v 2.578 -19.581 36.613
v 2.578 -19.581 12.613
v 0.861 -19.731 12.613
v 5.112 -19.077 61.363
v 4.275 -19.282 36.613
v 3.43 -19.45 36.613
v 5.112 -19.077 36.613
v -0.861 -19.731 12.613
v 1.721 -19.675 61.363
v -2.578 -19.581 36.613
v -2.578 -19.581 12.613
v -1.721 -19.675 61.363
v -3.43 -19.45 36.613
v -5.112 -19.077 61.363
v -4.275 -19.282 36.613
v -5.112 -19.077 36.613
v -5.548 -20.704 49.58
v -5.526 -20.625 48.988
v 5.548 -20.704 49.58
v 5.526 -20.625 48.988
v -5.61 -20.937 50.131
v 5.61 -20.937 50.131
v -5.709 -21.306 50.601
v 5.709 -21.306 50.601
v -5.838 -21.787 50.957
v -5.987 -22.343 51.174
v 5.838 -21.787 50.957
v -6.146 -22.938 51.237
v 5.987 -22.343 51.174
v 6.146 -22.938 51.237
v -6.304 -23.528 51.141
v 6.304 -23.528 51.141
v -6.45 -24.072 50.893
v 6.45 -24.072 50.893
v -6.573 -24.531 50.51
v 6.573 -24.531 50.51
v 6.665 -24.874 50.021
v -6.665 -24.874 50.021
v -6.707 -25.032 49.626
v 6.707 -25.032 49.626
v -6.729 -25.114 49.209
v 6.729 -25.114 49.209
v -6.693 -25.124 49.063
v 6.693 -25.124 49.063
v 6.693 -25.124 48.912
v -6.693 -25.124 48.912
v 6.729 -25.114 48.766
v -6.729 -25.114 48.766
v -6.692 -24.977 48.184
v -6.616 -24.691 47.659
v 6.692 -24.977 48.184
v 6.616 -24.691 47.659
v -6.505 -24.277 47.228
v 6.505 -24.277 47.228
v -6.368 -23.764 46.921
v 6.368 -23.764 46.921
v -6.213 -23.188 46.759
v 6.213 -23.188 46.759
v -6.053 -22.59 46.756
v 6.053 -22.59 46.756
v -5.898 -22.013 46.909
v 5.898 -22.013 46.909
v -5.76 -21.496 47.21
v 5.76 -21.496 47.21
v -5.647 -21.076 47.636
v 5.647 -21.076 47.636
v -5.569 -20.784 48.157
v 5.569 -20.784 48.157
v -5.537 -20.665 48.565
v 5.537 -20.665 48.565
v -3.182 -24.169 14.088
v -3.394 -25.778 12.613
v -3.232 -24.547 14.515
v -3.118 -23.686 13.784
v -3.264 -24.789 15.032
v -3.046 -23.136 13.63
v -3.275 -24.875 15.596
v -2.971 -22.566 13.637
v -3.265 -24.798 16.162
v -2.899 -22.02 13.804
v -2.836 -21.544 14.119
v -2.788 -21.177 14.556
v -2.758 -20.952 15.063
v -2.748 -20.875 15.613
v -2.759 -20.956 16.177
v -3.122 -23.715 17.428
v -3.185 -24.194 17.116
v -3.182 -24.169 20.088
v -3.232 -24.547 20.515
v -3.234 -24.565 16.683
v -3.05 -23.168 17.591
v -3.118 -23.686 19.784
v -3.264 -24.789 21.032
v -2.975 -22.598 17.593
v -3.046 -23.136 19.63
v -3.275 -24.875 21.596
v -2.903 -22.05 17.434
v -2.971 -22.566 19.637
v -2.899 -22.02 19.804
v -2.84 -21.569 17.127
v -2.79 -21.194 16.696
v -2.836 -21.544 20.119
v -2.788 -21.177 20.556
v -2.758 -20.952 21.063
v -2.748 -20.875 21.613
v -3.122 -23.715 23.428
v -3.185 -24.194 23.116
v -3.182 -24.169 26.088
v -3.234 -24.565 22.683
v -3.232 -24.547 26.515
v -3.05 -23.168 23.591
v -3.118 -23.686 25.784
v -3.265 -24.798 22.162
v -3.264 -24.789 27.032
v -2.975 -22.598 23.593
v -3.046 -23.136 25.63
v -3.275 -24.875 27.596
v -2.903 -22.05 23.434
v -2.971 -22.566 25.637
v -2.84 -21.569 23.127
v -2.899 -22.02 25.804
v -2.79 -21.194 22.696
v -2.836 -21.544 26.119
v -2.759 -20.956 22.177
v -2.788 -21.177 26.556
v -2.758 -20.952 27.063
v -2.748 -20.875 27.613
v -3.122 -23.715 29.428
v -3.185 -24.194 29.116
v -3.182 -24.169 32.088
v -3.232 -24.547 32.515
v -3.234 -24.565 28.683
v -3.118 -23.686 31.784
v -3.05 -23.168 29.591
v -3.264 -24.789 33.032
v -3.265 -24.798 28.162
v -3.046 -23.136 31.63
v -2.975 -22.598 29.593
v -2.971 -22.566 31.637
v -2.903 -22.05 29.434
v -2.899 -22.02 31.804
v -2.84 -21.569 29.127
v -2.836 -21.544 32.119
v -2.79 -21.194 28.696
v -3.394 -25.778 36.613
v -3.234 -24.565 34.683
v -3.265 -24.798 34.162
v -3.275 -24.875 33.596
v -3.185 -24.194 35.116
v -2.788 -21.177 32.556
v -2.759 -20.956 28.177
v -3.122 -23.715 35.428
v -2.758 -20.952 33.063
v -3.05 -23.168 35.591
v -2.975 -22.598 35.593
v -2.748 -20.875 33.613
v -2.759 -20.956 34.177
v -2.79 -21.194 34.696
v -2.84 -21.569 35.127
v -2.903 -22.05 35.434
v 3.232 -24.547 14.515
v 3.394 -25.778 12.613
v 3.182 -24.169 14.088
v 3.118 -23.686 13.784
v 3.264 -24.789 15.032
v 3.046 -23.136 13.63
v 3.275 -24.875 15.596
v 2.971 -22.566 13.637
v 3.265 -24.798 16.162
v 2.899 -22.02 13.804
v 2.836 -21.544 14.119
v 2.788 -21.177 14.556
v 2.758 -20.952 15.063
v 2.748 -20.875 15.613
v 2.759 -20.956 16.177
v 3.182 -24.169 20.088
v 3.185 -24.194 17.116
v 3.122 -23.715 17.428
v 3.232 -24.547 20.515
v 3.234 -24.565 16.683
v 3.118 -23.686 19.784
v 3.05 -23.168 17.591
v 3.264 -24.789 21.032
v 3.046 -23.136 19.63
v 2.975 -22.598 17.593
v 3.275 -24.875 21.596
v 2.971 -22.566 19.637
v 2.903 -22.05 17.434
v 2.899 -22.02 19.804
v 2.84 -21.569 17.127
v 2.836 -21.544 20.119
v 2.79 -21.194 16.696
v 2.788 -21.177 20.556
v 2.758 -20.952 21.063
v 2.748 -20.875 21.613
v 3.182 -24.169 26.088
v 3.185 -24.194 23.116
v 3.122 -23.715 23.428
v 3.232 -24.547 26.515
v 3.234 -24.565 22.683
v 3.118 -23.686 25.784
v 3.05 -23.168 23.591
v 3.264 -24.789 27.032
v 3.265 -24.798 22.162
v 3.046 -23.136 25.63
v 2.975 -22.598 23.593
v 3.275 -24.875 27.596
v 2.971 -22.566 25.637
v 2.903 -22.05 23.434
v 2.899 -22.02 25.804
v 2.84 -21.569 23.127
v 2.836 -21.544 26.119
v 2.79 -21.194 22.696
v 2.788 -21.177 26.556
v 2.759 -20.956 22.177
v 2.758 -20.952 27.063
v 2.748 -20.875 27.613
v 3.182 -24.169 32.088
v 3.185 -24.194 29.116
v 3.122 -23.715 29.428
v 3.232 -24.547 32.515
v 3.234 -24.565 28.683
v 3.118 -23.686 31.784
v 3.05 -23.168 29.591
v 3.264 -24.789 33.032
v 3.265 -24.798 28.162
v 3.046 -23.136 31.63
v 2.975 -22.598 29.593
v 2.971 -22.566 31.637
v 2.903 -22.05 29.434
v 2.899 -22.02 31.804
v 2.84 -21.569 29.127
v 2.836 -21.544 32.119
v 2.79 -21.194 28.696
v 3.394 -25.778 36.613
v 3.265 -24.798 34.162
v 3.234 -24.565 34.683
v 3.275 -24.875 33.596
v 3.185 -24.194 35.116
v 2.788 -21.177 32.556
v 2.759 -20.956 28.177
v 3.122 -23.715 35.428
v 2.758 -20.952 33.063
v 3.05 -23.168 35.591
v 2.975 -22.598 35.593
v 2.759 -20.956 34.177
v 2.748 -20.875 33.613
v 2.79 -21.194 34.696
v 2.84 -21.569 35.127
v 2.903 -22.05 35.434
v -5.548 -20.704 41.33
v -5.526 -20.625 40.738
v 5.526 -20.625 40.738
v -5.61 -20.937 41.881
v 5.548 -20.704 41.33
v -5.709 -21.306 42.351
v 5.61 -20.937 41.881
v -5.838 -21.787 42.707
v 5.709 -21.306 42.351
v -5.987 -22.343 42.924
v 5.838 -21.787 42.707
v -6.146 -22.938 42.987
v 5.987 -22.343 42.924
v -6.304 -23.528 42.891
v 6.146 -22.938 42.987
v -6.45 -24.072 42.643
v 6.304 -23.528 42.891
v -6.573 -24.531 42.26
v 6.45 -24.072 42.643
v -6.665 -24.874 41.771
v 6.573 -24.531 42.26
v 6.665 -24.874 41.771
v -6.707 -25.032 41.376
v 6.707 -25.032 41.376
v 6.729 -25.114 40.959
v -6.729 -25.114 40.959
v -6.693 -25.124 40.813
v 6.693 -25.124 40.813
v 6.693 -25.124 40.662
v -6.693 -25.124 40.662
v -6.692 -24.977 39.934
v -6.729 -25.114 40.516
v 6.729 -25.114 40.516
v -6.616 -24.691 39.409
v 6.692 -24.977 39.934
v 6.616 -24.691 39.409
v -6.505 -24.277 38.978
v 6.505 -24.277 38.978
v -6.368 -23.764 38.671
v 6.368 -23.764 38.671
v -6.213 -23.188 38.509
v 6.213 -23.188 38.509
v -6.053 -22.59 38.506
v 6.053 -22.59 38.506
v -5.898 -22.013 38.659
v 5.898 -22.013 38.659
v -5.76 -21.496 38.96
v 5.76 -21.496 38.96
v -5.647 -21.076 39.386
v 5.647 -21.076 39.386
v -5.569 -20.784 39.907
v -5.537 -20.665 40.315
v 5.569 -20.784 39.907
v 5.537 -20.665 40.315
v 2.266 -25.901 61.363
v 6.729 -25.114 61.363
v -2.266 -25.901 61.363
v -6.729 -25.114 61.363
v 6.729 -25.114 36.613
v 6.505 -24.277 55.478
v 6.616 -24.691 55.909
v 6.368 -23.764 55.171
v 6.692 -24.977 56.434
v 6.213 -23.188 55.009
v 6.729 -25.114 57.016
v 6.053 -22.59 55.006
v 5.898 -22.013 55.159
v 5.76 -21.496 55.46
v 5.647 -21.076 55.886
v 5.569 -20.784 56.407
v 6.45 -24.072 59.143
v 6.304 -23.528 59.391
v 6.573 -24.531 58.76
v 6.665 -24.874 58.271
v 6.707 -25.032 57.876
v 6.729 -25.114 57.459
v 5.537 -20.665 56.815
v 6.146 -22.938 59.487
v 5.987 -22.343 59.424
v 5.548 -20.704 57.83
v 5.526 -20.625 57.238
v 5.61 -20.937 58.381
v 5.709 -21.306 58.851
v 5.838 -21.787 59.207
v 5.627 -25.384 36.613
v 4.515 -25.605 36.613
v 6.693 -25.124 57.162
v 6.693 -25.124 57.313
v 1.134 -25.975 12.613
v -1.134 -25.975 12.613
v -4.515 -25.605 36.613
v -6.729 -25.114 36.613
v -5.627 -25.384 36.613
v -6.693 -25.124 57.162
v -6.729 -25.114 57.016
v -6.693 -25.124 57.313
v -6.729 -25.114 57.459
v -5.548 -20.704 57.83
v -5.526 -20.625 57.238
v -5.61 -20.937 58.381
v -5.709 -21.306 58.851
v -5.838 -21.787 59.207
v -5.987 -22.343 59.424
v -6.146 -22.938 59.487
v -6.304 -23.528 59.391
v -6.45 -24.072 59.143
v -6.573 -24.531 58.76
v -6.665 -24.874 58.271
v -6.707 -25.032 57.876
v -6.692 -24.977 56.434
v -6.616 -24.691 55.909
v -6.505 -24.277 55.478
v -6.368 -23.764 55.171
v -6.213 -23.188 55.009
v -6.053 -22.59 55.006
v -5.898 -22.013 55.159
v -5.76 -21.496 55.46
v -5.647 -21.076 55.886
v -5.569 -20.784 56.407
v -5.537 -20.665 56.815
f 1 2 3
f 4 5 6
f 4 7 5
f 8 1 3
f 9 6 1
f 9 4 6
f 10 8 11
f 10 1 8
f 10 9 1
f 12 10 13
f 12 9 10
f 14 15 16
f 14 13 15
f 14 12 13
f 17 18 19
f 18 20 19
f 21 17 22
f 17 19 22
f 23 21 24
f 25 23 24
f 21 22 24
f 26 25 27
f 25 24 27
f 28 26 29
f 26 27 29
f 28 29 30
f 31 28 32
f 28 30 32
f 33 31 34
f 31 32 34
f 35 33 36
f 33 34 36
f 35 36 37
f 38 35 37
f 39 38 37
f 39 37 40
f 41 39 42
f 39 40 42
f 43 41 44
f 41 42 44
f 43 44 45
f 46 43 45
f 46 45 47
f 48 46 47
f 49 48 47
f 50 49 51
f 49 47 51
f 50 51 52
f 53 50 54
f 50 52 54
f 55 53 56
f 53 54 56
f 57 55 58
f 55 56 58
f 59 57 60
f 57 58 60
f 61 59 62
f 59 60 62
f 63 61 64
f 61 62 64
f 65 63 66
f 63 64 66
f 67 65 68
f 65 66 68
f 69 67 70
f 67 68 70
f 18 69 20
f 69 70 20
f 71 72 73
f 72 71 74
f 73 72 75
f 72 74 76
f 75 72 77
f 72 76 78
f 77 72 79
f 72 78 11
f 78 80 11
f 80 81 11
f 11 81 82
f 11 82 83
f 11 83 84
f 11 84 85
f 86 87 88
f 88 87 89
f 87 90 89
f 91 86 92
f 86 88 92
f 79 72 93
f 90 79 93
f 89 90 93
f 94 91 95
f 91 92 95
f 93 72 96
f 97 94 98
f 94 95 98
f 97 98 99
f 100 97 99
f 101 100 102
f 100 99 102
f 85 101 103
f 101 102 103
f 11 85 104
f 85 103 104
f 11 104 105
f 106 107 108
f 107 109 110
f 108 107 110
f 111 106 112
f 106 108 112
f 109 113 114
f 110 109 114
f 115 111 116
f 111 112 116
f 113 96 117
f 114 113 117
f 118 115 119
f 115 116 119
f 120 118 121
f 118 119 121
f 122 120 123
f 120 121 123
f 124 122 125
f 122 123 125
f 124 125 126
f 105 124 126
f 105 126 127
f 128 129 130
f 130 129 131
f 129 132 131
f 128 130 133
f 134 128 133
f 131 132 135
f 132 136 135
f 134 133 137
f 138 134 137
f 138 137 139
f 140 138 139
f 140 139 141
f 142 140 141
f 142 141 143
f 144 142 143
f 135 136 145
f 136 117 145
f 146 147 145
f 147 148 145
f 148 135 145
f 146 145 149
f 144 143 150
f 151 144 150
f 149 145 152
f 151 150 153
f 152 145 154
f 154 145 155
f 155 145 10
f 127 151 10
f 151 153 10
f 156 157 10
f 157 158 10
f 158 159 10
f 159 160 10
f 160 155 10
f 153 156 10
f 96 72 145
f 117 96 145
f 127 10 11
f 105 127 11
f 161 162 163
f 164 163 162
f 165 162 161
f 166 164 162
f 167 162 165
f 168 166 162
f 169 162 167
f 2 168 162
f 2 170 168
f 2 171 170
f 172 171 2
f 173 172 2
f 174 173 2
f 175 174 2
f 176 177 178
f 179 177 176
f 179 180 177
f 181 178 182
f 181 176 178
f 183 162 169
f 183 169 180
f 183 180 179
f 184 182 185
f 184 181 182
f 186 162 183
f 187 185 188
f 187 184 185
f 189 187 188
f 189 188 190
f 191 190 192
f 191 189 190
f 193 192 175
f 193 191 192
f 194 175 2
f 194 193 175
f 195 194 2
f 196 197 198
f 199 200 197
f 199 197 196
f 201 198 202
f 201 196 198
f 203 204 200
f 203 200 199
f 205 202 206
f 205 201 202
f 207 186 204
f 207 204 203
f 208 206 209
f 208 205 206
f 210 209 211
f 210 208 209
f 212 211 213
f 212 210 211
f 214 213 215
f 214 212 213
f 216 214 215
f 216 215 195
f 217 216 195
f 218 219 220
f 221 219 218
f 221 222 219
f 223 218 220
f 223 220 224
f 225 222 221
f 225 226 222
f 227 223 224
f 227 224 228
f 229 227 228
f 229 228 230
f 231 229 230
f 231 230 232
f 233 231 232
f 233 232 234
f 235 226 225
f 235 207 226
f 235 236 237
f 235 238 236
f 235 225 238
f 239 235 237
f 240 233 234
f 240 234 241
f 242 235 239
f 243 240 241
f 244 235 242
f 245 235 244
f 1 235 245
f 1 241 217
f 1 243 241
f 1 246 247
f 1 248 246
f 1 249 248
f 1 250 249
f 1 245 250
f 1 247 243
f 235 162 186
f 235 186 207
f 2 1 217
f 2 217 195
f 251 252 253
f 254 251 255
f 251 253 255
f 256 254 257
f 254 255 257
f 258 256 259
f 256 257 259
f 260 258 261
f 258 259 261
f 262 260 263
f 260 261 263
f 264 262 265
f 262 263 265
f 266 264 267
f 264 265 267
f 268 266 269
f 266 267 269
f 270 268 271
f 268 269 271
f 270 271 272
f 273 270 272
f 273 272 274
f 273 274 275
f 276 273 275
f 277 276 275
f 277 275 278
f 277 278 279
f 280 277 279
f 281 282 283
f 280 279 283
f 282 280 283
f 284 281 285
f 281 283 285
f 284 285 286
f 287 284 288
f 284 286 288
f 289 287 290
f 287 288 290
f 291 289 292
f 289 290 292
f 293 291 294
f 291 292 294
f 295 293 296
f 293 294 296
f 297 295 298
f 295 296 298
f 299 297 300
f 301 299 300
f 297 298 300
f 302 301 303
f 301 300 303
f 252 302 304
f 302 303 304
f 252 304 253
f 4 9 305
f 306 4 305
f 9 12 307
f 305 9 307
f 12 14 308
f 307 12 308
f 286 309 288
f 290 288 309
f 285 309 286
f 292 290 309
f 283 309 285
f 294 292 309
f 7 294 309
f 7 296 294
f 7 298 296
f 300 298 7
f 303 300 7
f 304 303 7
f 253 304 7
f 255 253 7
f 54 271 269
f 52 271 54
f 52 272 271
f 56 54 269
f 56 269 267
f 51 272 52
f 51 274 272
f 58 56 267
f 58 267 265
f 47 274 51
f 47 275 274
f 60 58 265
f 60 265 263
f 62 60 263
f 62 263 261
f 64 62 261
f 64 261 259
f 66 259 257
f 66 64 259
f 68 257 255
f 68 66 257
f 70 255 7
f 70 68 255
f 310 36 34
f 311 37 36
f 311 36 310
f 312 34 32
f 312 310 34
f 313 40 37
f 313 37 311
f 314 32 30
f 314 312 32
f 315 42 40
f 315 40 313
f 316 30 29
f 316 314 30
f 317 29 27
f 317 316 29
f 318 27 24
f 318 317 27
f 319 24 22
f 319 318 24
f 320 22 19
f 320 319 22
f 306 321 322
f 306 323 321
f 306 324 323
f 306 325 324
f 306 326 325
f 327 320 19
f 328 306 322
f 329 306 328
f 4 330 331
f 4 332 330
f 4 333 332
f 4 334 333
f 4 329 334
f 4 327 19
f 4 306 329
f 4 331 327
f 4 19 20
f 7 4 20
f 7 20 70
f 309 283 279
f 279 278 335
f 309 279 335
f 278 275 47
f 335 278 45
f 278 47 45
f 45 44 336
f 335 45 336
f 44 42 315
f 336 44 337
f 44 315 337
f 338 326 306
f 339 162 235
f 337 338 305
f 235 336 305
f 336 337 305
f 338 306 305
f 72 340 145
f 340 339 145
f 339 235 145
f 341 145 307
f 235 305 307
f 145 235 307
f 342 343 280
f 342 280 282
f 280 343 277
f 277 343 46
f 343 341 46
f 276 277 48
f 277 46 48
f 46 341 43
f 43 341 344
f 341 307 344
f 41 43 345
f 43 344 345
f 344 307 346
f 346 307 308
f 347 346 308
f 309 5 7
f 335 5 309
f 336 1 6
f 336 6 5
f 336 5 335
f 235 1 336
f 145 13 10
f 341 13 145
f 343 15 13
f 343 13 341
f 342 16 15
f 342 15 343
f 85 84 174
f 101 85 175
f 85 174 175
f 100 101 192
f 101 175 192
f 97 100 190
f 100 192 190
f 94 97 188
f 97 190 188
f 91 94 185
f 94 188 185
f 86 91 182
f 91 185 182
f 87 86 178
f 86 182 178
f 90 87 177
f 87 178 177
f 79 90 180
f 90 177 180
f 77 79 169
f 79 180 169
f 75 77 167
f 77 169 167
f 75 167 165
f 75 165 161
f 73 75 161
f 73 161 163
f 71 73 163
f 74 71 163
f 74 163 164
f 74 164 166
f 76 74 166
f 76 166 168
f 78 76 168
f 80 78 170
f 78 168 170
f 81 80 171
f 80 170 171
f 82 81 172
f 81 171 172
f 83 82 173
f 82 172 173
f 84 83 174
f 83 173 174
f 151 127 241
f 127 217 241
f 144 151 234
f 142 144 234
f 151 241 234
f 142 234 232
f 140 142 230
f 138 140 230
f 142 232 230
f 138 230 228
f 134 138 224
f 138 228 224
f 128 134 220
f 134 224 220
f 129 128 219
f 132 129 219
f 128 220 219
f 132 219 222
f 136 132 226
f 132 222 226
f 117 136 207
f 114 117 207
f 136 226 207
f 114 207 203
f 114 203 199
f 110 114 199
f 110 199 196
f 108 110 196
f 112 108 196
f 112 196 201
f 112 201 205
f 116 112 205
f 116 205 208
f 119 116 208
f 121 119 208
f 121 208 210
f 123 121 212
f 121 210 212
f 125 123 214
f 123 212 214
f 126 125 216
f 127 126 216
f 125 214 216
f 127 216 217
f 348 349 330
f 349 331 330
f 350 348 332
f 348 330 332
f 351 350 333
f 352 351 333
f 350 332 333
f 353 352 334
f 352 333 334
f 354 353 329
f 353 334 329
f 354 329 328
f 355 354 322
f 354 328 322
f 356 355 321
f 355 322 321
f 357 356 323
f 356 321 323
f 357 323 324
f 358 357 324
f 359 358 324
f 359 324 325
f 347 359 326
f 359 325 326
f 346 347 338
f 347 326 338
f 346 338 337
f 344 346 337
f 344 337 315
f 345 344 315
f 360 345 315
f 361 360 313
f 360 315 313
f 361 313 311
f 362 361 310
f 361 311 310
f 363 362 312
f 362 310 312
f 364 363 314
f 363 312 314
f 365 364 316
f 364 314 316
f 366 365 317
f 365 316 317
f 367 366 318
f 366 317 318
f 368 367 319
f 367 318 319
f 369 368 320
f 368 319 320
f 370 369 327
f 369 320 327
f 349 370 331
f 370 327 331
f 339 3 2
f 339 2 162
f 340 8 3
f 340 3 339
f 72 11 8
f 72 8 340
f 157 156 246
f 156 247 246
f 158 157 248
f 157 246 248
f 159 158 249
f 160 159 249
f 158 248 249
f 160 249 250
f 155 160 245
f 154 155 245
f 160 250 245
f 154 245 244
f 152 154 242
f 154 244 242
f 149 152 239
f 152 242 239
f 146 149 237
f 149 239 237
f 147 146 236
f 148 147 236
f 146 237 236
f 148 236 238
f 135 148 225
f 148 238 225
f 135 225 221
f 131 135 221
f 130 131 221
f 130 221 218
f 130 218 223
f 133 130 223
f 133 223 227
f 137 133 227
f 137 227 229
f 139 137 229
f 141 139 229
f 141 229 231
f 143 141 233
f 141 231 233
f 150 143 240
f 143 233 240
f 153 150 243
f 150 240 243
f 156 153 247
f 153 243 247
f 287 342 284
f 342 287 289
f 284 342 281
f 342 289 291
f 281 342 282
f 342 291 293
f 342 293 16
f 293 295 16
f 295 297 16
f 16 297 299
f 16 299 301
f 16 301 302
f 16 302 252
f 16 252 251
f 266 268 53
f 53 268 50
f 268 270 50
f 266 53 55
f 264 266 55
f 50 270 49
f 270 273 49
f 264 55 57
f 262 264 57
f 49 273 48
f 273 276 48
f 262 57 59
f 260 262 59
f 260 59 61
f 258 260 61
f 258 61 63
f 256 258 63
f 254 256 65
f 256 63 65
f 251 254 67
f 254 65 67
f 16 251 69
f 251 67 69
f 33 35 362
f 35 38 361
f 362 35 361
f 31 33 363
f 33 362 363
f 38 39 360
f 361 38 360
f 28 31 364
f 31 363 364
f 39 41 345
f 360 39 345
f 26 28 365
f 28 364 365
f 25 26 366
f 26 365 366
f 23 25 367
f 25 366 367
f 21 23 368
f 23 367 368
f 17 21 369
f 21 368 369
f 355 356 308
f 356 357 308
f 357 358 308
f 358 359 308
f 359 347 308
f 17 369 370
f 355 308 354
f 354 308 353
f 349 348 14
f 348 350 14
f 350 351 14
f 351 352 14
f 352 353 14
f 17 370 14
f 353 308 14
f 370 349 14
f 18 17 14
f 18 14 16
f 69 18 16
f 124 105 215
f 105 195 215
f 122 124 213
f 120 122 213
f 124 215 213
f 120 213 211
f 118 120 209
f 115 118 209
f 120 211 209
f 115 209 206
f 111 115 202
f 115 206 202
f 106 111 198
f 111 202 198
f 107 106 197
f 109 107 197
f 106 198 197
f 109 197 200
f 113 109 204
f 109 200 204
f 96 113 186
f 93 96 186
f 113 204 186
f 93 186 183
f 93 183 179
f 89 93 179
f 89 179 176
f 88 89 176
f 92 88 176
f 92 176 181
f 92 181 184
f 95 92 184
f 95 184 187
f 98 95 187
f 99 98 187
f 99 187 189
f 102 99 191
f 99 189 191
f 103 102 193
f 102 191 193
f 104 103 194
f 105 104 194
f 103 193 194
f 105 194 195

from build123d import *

# Parameters (mm, degrees)
F0_W     = 6.25
F0_H     = 24.75
F0_R     = 2.25
F1_ANGLE = 30
F2_DEPTH = 12.5
F0_H_2   = 24
F0_R_2   = 2
F3_ANGLE = 15
F4_DEPTH = 5


with BuildPart() as f1:
    # F0 (on Right) → F1 (revolve, symmetric)
    with BuildSketch(Plane.YZ) as f1_sk:
        with Locations((-22.875, 48.987537)):
            Rectangle(F0_W, F0_H)
        with Locations((-22.875, 40.737537)):
            Circle(F0_R, mode=Mode.SUBTRACT)
        with Locations((-22.875, 48.987537)):
            Circle(F0_R, mode=Mode.SUBTRACT)
        with Locations((-22.875, 57.237537)):
            Circle(F0_R, mode=Mode.SUBTRACT)
        with Locations((-22.875, 57.237537)):
            Circle(F0_R)
        with Locations((-22.875, 48.987537)):
            Circle(F0_R)
        with Locations((-22.875, 40.737537)):
            Circle(F0_R)
    revolve(axis=Axis((0, 0, 63), (0, 0, 1)), revolution_arc=F1_ANGLE / 2)
    revolve(f1_sk.sketch, axis=Axis((0, 0, 63), (0, 0, -1)), revolution_arc=F1_ANGLE / 2)

    # F0 (on Right) → F2 (cut, symmetric)
    with BuildSketch(Plane.YZ):
        with Locations((-22.875, 57.237537)):
            Circle(F0_R)
        with Locations((-22.875, 48.987537)):
            Circle(F0_R)
        with Locations((-22.875, 40.737537)):
            Circle(F0_R)
    extrude(amount=F2_DEPTH, both=True, mode=Mode.SUBTRACT)

    # F0 (on Right) → F3 (revolve, symmetric)
    with BuildSketch(Plane.YZ) as f3_sk:
        with Locations((-22.875, 24.612537)):
            Rectangle(F0_W, F0_H_2)
        with Locations((-22.875, 15.612537)):
            Circle(F0_R_2, mode=Mode.SUBTRACT)
        with Locations((-22.875, 21.612537)):
            Circle(F0_R_2, mode=Mode.SUBTRACT)
        with Locations((-22.875, 27.612537)):
            Circle(F0_R_2, mode=Mode.SUBTRACT)
        with Locations((-22.875, 33.612537)):
            Circle(F0_R_2, mode=Mode.SUBTRACT)
        with Locations((-22.875, 33.612537)):
            Circle(F0_R_2)
        with Locations((-22.875, 27.612537)):
            Circle(F0_R_2)
        with Locations((-22.875, 21.612537)):
            Circle(F0_R_2)
        with Locations((-22.875, 15.612537)):
            Circle(F0_R_2)
    revolve(axis=Axis((0, 0, 63), (0, 0, 1)), revolution_arc=F3_ANGLE / 2)
    revolve(f3_sk.sketch, axis=Axis((0, 0, 63), (0, 0, -1)), revolution_arc=F3_ANGLE / 2)

    # F0 (on Right) → F4 (cut, symmetric)
    with BuildSketch(Plane.YZ):
        with Locations((-22.875, 33.612537)):
            Circle(F0_R_2)
        with Locations((-22.875, 27.612537)):
            Circle(F0_R_2)
        with Locations((-22.875, 21.612537)):
            Circle(F0_R_2)
        with Locations((-22.875, 15.612537)):
            Circle(F0_R_2)
    extrude(amount=F4_DEPTH, both=True, mode=Mode.SUBTRACT)


solid = f1.part
